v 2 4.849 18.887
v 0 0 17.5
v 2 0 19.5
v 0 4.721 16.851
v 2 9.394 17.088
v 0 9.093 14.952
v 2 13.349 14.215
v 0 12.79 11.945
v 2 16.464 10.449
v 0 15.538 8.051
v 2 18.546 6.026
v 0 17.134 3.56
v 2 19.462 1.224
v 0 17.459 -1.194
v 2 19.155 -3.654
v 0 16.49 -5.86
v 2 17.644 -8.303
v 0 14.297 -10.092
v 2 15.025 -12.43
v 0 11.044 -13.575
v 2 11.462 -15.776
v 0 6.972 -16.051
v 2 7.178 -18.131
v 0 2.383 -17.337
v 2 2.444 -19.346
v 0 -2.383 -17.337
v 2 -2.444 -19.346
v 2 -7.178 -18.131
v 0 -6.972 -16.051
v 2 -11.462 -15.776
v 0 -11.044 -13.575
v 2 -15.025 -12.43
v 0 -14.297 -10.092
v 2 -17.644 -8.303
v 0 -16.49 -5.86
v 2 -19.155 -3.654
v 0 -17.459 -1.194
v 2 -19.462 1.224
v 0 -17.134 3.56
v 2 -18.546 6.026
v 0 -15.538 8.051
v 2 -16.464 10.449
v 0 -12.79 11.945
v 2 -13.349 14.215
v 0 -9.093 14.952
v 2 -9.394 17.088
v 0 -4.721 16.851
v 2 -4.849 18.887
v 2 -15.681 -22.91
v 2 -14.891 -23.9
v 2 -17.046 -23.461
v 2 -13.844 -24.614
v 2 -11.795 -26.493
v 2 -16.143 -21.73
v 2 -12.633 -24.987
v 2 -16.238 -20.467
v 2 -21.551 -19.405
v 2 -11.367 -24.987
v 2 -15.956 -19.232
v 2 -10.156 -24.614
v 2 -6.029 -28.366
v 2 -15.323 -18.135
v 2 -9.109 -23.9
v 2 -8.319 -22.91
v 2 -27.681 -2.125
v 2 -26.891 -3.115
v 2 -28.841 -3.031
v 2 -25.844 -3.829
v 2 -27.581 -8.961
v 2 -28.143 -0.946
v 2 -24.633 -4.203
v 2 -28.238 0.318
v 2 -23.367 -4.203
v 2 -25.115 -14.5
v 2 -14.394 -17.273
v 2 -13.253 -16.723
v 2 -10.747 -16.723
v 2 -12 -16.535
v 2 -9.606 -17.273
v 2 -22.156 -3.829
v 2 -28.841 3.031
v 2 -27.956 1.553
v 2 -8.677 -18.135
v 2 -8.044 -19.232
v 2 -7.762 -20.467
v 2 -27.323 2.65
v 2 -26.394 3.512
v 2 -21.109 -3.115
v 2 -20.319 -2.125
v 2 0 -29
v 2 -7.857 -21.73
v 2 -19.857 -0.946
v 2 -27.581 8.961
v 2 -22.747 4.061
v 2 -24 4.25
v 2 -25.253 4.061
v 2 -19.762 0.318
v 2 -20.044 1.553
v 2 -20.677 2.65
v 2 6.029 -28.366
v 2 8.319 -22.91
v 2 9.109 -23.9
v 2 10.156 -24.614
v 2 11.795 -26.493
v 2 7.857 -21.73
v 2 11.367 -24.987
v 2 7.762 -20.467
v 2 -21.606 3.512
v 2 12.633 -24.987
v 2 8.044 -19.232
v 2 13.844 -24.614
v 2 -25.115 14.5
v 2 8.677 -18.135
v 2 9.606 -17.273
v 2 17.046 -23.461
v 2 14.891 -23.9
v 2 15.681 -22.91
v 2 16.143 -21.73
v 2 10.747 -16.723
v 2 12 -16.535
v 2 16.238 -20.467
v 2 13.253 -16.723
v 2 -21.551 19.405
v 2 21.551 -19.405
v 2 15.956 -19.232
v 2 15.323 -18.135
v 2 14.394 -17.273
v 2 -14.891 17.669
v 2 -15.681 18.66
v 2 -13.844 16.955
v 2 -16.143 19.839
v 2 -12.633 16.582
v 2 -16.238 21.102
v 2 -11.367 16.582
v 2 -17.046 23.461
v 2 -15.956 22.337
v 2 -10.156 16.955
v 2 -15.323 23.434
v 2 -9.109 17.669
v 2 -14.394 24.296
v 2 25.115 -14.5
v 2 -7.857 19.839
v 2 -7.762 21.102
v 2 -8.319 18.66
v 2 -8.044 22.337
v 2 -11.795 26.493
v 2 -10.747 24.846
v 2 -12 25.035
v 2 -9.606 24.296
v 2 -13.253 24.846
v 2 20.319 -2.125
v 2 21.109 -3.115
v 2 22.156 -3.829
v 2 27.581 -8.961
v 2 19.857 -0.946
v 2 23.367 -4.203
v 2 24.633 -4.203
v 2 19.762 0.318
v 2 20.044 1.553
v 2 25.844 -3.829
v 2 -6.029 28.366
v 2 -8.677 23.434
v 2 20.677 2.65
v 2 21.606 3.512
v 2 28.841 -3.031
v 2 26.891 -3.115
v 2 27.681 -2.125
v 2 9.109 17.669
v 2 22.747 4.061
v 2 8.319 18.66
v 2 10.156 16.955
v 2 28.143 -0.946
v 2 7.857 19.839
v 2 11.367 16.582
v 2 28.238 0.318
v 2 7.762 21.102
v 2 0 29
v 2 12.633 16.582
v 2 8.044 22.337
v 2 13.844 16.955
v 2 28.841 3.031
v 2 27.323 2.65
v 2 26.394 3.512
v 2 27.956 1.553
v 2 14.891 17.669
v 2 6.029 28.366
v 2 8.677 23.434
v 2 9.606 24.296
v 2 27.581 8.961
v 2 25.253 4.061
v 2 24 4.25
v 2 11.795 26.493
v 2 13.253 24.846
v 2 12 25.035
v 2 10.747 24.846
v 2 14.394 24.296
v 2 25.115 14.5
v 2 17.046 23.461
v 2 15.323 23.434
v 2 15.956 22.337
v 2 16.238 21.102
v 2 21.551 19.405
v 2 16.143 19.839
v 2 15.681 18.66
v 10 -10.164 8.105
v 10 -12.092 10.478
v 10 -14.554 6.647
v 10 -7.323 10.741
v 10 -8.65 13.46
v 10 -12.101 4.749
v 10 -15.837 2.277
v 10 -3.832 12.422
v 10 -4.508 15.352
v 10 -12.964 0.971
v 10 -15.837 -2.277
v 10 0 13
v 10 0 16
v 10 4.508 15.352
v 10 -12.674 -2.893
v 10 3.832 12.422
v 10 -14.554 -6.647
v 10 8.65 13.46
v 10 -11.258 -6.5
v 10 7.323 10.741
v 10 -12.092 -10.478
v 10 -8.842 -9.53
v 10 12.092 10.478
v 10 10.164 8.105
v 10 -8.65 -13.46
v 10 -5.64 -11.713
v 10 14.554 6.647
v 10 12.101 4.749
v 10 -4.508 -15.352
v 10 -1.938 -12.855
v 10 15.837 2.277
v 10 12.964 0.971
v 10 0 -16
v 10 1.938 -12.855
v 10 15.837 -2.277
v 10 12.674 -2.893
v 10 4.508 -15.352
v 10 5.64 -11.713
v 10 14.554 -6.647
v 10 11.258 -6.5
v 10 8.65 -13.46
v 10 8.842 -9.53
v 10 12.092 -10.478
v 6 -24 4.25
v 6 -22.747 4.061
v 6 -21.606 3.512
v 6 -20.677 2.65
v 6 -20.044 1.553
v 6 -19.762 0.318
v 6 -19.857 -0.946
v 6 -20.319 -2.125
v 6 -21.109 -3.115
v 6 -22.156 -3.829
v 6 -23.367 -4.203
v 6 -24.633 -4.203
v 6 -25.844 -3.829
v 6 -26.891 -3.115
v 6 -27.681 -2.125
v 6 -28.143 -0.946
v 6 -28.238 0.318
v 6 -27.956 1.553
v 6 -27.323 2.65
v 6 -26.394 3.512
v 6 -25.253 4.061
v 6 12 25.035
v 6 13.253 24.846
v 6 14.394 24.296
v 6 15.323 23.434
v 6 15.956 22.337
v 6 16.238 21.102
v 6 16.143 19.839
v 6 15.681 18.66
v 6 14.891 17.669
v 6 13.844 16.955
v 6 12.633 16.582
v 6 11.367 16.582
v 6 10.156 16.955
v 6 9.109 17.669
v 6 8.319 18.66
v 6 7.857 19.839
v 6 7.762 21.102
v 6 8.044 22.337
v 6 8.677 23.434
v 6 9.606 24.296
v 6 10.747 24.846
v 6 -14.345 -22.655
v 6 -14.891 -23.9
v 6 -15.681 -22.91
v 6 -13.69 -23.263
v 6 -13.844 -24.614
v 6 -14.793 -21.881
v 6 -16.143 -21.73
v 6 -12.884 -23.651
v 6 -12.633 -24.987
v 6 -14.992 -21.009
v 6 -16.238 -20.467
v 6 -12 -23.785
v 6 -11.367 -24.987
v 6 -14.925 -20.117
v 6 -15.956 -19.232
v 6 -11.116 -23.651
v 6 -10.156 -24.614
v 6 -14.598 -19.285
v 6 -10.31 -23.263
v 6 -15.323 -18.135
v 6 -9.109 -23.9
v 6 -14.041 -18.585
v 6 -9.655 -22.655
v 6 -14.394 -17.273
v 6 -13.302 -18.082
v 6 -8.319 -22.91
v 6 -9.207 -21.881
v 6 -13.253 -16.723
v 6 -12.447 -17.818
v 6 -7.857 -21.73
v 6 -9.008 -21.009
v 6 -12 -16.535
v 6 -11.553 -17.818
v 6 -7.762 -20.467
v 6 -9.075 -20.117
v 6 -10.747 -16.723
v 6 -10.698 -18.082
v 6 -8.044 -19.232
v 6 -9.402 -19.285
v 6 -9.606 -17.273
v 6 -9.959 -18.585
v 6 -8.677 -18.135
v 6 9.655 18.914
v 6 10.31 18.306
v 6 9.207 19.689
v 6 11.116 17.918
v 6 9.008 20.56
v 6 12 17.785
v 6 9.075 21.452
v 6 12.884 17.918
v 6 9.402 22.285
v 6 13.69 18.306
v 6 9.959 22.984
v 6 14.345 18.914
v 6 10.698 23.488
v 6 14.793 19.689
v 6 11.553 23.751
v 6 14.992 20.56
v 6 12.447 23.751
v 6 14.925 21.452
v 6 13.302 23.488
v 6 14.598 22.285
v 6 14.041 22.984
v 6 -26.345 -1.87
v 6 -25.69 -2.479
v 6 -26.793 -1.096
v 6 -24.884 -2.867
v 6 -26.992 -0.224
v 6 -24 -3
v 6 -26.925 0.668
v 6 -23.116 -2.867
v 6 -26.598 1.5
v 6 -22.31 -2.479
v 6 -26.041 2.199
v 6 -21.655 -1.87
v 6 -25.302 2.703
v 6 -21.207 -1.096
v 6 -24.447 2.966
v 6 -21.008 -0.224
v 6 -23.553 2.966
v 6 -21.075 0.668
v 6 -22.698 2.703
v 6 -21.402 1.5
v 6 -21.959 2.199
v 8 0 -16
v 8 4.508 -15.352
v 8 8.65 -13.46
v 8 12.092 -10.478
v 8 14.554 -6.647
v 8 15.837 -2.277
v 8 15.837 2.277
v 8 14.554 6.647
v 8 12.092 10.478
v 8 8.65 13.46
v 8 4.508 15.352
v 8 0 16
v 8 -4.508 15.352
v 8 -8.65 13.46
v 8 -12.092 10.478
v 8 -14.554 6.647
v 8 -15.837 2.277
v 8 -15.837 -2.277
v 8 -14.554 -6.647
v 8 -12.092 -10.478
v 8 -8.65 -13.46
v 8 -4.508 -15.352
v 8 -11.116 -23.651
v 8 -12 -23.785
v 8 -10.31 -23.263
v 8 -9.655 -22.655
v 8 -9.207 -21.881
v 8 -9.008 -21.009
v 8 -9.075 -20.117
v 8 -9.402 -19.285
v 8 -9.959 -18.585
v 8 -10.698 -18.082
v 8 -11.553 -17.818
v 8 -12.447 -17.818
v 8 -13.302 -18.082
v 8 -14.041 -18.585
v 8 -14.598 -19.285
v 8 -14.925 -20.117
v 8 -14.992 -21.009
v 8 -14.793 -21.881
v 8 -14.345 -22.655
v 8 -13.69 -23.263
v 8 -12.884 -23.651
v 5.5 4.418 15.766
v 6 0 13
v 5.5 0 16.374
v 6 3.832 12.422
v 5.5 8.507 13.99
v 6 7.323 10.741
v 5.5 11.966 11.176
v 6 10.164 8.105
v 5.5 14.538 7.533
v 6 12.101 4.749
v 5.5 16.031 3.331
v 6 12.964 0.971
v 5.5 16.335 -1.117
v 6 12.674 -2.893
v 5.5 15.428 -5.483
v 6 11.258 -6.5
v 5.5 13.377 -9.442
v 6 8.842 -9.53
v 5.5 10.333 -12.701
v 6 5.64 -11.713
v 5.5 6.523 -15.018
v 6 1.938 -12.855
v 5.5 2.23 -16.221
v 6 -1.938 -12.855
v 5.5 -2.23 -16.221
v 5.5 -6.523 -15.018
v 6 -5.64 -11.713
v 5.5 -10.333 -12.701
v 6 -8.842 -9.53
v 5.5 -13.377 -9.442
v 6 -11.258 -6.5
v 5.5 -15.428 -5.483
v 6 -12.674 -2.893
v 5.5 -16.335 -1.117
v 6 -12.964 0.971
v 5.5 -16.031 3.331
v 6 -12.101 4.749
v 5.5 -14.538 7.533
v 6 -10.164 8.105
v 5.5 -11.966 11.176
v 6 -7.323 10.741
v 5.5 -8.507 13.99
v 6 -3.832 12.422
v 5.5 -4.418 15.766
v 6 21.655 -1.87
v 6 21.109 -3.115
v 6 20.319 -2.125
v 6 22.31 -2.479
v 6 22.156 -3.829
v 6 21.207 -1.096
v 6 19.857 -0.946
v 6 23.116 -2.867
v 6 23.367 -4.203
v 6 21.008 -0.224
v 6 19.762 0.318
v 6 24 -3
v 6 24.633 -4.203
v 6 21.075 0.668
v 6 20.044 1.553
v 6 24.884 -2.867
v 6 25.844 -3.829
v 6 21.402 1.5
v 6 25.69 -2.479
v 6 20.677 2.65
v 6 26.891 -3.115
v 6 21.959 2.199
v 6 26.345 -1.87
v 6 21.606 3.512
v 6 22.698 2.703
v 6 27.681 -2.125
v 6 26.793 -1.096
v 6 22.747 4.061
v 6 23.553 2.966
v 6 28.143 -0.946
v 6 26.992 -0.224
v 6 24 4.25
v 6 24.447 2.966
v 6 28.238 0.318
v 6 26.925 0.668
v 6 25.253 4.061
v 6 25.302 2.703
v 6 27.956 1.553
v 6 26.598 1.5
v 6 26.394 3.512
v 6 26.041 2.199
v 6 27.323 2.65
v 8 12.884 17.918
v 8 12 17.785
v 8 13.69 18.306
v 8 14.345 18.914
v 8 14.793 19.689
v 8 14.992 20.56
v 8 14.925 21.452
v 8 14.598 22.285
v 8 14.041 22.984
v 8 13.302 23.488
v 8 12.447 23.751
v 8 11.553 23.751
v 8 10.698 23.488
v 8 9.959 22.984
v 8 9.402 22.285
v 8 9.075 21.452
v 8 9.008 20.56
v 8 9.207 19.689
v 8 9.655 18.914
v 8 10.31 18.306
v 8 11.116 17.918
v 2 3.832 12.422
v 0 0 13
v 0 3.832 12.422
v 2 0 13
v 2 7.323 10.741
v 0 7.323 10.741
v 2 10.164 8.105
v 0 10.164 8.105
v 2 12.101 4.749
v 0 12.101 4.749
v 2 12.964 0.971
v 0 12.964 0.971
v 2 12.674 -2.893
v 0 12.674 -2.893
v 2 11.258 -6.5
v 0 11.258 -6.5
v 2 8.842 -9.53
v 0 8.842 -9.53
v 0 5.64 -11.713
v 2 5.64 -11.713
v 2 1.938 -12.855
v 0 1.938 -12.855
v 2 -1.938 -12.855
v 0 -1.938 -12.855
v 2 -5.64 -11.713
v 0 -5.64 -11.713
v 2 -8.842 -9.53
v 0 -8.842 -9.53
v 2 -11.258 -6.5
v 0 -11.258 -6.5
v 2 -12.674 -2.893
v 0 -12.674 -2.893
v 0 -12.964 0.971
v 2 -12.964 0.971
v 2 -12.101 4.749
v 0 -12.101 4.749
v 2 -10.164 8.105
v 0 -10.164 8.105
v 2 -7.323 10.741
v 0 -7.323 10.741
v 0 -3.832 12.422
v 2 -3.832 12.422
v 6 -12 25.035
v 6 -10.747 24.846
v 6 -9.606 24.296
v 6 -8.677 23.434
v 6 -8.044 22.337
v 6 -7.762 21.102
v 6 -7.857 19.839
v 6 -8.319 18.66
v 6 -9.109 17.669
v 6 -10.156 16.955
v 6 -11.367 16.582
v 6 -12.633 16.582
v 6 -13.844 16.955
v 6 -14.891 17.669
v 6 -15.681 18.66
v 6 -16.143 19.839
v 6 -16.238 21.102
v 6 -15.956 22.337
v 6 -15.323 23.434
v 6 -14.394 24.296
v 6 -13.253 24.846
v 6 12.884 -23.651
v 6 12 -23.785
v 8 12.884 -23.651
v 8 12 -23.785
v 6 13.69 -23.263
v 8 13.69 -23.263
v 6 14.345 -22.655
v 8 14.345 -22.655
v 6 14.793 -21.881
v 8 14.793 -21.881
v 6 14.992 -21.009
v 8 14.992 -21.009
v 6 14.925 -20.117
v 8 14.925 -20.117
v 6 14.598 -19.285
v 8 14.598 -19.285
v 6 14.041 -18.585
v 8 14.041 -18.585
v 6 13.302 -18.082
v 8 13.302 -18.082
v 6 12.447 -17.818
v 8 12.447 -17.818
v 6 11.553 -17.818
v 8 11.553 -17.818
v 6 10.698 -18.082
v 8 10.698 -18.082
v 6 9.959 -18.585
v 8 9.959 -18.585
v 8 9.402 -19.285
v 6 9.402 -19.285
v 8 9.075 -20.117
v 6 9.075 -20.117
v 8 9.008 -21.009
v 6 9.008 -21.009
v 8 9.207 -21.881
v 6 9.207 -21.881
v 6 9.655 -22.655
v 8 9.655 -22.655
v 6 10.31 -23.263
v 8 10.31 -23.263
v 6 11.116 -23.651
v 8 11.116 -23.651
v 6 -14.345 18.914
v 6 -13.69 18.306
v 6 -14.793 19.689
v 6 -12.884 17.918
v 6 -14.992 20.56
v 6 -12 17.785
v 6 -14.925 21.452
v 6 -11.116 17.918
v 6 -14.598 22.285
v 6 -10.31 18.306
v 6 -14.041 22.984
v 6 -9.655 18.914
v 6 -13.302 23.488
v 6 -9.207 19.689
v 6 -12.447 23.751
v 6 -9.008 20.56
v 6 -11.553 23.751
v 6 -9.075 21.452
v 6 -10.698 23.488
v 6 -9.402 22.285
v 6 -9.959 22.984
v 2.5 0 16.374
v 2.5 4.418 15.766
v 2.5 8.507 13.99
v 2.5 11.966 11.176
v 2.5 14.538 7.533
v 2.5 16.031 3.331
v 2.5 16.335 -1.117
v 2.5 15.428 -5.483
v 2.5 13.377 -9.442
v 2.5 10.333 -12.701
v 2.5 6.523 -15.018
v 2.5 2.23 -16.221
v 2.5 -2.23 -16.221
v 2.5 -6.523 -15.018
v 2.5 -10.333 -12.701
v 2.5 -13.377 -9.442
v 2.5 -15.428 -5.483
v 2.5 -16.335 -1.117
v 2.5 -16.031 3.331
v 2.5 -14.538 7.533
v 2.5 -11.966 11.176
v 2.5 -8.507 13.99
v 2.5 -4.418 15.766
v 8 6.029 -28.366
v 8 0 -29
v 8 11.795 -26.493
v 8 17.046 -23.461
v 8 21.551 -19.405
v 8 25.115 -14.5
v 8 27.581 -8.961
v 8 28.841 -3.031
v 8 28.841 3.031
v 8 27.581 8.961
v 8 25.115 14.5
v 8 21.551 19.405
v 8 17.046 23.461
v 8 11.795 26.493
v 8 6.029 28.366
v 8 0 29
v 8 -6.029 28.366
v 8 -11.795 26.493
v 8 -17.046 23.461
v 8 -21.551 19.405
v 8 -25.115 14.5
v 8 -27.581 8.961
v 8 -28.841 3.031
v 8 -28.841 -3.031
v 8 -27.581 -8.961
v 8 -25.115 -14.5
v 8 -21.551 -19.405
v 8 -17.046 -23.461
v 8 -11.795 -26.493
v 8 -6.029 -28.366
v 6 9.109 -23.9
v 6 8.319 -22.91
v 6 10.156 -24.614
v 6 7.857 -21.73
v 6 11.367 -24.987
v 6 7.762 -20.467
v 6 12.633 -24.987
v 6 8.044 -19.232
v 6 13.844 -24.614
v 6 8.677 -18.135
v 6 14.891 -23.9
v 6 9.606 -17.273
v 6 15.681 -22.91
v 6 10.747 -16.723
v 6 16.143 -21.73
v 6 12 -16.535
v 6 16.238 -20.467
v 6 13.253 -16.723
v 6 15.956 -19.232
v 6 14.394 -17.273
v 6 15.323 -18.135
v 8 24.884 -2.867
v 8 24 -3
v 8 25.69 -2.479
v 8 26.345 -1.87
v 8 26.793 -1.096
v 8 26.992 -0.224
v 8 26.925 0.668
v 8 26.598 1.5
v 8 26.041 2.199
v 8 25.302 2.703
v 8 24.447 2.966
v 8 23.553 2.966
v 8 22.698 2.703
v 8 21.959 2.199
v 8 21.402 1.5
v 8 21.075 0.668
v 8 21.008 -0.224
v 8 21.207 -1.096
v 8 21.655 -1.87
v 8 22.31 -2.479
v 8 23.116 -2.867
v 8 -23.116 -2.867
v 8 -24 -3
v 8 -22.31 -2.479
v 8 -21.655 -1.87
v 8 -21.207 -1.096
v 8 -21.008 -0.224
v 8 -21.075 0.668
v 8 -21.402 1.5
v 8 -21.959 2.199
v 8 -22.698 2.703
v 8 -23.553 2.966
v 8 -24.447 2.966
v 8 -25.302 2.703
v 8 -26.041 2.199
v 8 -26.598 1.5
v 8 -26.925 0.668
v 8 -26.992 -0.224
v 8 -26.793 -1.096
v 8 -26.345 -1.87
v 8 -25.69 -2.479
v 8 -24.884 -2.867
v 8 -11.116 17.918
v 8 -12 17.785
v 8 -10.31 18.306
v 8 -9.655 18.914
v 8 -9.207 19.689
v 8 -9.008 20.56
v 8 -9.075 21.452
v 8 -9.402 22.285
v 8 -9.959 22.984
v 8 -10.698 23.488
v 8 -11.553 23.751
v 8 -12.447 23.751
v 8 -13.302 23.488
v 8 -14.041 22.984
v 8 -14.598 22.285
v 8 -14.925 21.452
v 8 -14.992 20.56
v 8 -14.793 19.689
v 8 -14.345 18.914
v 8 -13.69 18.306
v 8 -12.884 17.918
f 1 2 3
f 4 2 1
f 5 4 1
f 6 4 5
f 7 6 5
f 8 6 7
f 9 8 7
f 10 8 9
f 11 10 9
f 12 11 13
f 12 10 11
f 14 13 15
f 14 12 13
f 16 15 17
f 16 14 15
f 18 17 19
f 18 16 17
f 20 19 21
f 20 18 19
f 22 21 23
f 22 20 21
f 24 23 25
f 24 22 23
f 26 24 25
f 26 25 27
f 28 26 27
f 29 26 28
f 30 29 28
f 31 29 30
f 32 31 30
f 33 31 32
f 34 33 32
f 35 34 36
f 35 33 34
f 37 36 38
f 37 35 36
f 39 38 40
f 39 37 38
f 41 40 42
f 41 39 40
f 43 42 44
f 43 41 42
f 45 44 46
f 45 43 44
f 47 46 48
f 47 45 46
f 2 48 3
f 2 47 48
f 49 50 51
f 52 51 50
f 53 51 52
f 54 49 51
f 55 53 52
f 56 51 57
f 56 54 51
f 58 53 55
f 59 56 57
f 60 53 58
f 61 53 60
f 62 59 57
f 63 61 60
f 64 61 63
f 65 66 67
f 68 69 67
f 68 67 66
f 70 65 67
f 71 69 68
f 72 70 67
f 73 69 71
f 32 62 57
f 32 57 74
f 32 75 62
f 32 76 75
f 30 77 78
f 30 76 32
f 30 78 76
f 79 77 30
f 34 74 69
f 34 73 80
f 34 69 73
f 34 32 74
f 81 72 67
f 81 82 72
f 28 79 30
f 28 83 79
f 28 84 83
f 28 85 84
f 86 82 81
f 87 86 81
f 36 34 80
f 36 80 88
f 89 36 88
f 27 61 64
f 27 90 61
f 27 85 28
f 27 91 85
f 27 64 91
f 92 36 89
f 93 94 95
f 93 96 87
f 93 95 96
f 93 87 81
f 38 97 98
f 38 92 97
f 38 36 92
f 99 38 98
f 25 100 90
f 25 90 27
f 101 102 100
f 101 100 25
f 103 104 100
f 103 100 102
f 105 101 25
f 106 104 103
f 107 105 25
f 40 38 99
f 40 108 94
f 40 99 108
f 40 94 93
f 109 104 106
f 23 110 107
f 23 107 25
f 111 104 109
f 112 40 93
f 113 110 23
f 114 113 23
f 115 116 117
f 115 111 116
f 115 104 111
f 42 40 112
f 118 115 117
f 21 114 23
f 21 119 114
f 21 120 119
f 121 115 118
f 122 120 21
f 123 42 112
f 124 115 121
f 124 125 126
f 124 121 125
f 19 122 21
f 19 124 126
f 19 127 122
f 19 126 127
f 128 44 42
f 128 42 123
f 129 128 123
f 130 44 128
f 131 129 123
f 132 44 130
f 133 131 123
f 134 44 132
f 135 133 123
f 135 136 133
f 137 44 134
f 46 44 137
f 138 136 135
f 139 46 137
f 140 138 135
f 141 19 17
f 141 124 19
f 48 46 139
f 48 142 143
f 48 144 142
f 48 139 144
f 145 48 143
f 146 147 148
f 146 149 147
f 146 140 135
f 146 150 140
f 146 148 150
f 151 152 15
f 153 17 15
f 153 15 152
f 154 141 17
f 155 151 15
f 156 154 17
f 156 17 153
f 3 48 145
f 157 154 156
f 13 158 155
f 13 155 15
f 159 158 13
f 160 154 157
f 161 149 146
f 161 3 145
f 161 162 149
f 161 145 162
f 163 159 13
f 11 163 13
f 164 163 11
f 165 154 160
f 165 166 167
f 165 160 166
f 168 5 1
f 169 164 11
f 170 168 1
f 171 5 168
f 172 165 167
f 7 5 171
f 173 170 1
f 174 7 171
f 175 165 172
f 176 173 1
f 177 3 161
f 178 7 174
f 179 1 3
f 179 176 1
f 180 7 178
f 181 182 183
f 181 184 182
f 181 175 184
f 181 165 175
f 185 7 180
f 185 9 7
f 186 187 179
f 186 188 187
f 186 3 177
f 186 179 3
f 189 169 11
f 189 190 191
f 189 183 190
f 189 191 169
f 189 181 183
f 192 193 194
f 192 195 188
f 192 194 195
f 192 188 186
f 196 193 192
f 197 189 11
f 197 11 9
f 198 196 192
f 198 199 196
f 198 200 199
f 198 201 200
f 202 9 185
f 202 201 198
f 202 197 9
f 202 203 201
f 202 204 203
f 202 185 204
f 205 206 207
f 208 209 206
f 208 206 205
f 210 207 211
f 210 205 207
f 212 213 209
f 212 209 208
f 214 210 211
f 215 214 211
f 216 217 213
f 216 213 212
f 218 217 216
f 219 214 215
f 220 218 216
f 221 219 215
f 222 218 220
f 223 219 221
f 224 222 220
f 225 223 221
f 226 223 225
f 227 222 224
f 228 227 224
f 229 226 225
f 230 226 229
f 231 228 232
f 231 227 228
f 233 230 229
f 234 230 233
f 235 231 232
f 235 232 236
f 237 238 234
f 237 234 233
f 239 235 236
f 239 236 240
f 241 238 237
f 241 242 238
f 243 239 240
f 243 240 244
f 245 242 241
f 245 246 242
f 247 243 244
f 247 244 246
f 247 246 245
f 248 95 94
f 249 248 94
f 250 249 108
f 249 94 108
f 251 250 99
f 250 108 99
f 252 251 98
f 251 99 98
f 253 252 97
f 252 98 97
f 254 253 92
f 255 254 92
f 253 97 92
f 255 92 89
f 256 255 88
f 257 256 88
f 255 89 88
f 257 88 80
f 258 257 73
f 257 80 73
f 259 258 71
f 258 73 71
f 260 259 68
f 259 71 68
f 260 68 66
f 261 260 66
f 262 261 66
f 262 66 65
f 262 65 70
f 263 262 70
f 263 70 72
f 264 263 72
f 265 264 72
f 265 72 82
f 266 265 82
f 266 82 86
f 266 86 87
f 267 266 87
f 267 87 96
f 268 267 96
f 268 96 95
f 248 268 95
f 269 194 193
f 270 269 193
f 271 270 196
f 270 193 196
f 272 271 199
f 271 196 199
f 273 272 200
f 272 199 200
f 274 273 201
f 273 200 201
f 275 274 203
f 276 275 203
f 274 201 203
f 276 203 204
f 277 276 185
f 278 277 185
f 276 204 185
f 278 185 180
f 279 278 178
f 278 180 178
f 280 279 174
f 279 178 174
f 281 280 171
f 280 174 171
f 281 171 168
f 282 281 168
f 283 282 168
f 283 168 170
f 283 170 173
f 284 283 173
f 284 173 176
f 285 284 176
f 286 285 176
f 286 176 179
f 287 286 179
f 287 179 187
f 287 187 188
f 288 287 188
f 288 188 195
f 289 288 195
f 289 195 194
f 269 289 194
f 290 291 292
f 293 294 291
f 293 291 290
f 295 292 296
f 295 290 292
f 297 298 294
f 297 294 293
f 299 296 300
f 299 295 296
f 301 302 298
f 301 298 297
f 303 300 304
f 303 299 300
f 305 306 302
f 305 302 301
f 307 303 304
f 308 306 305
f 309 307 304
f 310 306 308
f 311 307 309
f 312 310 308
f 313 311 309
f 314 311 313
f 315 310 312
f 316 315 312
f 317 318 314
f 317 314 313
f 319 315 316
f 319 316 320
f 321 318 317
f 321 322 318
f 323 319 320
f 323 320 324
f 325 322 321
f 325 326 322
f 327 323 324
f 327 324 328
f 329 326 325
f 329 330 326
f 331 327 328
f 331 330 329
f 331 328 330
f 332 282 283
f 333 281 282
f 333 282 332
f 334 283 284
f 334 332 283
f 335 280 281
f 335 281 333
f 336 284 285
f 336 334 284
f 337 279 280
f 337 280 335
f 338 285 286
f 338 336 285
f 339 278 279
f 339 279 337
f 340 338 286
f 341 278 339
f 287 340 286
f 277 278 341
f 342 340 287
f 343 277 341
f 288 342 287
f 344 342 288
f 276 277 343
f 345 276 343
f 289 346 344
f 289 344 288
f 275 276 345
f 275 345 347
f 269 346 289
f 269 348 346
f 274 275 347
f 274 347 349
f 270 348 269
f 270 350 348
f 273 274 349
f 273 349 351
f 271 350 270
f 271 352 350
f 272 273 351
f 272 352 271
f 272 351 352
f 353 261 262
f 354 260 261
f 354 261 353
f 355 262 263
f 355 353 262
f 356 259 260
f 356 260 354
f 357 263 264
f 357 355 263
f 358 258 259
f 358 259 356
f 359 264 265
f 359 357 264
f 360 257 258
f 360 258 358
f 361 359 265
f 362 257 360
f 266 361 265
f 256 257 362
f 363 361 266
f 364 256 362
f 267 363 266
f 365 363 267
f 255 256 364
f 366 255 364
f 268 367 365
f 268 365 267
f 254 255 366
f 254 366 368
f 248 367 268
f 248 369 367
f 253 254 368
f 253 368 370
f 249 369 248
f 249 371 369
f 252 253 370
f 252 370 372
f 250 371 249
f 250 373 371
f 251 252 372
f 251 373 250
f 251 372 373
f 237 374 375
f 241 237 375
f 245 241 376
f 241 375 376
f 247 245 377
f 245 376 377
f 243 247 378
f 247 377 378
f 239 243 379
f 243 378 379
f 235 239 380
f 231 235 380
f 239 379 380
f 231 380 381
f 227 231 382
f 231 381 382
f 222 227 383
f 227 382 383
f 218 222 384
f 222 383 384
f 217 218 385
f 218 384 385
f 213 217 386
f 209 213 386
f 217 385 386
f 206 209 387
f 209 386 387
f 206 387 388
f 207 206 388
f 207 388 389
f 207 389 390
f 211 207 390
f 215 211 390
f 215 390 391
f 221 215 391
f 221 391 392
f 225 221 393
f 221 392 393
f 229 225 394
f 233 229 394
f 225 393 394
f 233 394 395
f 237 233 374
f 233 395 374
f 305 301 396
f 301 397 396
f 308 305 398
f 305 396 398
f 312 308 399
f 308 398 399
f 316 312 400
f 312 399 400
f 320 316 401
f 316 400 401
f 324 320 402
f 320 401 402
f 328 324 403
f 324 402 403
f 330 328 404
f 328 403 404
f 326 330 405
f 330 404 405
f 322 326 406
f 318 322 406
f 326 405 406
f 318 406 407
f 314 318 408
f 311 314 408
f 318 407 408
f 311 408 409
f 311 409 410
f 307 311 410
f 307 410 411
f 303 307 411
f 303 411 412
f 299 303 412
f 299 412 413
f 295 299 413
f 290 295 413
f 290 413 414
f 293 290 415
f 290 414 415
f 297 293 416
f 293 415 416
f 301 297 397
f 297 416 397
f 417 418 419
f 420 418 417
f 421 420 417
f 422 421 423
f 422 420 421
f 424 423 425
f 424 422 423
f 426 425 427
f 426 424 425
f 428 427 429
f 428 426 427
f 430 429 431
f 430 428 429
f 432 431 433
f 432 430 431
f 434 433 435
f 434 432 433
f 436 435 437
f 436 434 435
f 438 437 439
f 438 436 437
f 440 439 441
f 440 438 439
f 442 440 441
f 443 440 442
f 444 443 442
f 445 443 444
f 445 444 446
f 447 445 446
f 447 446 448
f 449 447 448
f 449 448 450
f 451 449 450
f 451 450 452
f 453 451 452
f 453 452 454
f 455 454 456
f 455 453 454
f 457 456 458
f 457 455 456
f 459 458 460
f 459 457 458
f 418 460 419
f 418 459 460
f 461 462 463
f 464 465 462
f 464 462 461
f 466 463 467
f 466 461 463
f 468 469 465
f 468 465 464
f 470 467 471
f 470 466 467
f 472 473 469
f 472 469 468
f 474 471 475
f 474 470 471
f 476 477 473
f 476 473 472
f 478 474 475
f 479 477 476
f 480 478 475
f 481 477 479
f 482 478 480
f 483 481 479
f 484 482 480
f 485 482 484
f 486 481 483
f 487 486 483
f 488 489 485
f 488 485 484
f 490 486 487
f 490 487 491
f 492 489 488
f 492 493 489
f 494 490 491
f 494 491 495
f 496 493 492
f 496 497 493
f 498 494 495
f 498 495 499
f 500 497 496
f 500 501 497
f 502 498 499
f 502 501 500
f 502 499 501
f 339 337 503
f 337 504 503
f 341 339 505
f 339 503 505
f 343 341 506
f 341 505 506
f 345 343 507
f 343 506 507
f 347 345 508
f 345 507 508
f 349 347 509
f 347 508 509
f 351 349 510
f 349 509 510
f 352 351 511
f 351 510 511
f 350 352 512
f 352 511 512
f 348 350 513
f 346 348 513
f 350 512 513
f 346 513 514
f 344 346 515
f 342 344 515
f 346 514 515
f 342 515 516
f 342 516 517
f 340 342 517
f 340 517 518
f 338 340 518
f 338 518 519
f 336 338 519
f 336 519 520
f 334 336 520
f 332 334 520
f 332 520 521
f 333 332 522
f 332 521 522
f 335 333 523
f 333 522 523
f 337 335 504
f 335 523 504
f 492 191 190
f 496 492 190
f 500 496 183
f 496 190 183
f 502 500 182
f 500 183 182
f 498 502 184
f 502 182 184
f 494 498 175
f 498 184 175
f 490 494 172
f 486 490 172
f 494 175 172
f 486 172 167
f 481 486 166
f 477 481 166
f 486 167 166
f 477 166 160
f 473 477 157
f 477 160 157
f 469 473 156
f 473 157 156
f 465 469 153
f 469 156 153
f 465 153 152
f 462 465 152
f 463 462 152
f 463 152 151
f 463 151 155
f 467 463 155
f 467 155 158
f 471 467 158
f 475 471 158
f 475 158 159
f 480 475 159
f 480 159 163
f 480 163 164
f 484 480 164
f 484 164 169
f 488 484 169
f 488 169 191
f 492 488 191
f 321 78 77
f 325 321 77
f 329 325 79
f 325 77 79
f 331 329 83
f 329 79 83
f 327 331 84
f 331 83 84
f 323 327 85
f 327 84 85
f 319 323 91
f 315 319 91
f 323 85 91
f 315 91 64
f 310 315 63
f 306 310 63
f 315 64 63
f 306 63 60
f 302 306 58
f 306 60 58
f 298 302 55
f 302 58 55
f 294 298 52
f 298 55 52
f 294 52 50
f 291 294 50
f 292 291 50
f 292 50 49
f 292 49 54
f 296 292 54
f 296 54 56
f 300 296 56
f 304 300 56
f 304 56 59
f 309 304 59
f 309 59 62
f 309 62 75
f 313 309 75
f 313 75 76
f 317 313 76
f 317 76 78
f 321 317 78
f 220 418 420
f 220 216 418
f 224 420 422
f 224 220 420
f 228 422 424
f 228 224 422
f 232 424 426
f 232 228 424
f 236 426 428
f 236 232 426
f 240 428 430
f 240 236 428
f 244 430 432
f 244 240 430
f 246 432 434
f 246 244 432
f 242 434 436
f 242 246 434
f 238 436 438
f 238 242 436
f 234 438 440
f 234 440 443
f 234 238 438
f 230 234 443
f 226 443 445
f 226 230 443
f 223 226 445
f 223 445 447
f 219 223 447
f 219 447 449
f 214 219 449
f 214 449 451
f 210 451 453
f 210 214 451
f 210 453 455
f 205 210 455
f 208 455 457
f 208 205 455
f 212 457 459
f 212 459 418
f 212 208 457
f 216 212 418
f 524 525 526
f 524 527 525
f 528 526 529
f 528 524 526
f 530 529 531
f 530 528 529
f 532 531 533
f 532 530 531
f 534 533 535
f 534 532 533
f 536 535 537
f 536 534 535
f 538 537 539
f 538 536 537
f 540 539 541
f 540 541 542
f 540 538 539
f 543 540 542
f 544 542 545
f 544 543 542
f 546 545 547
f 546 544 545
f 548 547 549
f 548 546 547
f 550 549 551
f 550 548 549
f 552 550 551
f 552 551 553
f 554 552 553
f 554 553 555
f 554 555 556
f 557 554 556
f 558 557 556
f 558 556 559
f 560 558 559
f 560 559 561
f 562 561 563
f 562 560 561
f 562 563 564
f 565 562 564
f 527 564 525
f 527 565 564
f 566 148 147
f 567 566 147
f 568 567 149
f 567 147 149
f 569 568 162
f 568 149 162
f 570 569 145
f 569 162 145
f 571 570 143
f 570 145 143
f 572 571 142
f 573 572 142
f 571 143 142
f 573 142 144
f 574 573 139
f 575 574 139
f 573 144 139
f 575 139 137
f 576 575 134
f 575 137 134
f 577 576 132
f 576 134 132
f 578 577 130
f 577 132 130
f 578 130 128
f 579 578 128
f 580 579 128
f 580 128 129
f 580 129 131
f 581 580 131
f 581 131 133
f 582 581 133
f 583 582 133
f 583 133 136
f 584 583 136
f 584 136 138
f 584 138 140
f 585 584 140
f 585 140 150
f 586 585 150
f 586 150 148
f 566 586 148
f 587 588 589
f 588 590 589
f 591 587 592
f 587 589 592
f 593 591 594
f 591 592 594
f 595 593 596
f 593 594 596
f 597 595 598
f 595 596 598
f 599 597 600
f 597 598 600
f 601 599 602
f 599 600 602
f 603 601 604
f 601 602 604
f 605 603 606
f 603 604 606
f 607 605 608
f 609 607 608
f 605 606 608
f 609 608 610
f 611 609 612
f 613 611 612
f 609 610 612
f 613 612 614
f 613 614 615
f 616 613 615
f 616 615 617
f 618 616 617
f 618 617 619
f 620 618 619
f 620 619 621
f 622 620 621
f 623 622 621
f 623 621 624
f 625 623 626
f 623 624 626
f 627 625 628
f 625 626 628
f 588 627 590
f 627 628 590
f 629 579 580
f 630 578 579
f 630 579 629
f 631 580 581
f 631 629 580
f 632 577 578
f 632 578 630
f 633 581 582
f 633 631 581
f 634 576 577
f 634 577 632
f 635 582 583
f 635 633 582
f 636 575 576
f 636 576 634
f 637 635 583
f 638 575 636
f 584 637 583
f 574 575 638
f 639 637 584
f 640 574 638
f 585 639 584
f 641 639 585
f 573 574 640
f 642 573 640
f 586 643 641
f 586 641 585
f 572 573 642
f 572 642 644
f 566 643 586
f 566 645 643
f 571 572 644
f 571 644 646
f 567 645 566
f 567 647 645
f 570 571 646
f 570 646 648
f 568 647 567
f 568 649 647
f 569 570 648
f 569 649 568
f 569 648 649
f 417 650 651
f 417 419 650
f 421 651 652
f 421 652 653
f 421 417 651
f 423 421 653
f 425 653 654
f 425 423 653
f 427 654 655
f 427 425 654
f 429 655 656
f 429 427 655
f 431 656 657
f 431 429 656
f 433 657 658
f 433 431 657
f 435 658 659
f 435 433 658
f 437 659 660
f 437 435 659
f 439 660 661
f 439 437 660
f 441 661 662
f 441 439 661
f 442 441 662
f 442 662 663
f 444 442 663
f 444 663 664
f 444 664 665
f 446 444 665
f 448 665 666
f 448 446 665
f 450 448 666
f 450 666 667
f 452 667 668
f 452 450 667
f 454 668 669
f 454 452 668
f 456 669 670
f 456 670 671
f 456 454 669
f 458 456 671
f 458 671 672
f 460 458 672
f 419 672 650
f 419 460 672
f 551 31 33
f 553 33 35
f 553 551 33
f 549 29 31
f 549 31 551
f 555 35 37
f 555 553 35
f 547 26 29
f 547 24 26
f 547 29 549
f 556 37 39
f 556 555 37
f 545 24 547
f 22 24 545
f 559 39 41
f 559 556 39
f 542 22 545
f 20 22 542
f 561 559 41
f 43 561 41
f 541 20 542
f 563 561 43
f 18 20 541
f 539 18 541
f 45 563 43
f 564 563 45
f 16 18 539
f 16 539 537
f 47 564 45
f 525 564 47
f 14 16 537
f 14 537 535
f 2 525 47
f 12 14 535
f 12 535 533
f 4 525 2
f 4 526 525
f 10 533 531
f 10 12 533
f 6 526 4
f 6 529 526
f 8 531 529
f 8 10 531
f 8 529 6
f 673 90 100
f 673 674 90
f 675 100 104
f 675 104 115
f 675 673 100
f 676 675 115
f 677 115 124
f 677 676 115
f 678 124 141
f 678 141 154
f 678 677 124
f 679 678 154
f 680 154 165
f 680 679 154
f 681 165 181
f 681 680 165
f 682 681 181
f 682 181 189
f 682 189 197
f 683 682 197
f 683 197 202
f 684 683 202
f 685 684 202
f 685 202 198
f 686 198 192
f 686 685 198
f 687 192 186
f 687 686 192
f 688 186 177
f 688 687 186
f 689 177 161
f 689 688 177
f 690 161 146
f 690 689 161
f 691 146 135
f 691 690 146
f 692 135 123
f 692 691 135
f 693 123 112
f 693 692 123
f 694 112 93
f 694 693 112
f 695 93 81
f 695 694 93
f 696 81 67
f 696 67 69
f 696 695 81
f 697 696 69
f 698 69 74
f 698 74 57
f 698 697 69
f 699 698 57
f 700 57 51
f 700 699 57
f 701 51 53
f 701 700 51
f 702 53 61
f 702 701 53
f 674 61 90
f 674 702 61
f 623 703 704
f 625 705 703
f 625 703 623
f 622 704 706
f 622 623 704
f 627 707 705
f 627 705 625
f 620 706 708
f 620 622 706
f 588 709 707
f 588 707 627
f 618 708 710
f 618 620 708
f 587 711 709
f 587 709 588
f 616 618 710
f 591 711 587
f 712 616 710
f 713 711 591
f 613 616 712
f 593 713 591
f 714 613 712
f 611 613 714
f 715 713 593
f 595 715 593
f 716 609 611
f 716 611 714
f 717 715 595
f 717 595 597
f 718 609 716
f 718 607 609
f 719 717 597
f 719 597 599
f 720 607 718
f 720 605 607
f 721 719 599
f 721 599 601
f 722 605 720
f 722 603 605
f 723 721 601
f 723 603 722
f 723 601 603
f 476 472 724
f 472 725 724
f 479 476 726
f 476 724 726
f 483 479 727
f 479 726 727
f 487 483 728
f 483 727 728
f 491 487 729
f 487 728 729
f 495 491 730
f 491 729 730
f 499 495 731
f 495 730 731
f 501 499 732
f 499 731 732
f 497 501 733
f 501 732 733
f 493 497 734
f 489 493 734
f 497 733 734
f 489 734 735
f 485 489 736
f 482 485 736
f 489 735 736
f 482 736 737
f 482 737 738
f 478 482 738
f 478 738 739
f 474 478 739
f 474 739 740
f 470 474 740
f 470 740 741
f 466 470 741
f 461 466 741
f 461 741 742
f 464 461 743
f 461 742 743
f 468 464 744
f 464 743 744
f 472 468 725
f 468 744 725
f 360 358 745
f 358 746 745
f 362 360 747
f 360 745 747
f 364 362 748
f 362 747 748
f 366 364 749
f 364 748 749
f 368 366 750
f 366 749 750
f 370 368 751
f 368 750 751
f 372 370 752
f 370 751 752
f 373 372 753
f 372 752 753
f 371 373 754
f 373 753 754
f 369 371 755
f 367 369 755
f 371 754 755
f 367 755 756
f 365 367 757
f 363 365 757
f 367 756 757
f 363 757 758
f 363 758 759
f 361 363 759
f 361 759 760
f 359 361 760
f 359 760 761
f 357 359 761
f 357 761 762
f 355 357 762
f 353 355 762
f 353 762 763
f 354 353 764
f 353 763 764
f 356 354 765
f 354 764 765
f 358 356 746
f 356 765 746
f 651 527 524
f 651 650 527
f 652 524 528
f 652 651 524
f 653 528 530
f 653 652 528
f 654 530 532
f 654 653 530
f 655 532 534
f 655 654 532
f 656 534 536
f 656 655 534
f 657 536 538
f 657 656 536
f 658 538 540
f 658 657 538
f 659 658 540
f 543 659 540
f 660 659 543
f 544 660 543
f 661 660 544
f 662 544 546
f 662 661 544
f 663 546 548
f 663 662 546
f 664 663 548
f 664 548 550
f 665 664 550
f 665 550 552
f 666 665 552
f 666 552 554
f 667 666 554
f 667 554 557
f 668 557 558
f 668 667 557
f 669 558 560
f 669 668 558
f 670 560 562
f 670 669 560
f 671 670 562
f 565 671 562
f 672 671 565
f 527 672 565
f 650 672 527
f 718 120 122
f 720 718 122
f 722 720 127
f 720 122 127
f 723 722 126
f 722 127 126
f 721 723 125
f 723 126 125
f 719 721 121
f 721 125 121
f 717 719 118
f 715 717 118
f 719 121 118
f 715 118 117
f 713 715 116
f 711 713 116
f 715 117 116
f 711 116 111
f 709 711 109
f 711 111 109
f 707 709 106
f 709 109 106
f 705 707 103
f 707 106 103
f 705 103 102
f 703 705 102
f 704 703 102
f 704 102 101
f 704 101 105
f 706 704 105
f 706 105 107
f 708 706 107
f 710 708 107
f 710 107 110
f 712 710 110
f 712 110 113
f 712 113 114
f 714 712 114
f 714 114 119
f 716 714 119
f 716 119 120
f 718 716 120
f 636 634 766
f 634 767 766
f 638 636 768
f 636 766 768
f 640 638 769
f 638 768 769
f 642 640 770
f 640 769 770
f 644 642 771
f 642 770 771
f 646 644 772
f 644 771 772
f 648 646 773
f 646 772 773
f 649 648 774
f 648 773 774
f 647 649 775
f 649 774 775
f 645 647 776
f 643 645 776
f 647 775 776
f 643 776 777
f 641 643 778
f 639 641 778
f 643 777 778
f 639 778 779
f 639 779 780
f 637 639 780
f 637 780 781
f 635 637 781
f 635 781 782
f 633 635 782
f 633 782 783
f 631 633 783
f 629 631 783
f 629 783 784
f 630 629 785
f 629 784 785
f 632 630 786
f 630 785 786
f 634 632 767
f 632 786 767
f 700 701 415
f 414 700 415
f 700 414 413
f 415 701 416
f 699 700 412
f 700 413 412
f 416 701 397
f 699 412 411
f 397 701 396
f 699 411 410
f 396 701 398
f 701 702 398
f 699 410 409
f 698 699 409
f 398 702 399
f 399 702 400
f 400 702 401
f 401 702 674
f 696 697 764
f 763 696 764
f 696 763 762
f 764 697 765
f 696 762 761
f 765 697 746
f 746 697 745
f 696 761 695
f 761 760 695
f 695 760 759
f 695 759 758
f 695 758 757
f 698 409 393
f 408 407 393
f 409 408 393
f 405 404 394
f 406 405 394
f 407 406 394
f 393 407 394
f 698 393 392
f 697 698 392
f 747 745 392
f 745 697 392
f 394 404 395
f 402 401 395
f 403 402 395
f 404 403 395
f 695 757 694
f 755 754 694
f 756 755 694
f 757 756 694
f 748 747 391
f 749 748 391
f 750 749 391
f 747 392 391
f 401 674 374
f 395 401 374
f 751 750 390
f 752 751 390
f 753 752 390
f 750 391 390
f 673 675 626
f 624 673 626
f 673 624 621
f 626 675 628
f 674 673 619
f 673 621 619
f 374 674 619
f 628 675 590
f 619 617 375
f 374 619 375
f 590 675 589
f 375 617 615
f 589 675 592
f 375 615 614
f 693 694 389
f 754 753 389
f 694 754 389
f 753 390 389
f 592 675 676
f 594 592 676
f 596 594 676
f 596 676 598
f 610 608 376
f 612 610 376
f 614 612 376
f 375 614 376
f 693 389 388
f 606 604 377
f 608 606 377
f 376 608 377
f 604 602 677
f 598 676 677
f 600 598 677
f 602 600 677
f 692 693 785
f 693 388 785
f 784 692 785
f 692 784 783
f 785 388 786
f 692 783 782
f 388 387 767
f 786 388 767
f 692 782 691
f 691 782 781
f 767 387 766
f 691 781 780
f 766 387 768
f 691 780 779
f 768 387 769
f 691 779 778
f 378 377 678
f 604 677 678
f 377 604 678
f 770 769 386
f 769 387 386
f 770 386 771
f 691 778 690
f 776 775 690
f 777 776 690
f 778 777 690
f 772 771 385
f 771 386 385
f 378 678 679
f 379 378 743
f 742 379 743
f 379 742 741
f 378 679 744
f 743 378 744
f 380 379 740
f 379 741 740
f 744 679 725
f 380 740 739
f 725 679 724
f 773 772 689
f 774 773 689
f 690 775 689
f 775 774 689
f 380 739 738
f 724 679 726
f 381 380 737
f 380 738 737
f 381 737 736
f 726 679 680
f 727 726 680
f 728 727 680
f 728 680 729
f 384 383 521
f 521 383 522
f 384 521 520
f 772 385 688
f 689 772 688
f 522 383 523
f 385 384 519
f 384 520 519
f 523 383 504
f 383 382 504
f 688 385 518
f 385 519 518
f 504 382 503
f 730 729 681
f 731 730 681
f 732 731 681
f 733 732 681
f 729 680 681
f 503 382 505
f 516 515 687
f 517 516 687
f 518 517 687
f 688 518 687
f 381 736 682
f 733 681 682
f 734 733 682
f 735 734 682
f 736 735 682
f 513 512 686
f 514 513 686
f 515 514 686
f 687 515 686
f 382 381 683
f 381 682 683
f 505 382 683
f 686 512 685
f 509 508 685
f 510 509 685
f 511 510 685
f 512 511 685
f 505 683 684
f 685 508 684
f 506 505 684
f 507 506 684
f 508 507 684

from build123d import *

# Parameters (mm, degrees)
SKETCH_1_W                = 6
SKETCH_1_H                = 29
SKETCH_2_R                = 19.5
EXTRUDE_1_DEPTH           = 2
EXTRUDE_1_TAPER           = 45
SKETCH_3_R                = 16
EXTRUDE_2_DEPTH           = 2
HOLE_WIZARD_1_D           = 6
HOLE_WIZARD_1_DEPTH       = 8
HOLE_WIZARD_1_CBORE_D     = 8.5
HOLE_WIZARD_1_CBORE_DEPTH = 4


with BuildPart() as part:
    # Эскиз1 → Повернуть1 (revolve)
    with BuildSketch(Plane.XY, mode=Mode.PRIVATE) as revolve_1_sk:
        with Locations((5, 14.5)):
            Rectangle(SKETCH_1_W, SKETCH_1_H)
    revolve(revolve_1_sk.sketch.rotate(Axis((2, 0, 0), (1, 0, 0)), 270), axis=Axis((2, 0, 0), (1, 0, 0)))

    # Эскиз2 → Бобышка-Вытянуть1 (add)
    with BuildSketch(Plane.ZY.offset(-2)):
        Circle(SKETCH_2_R)
    extrude(amount=EXTRUDE_1_DEPTH, taper=EXTRUDE_1_TAPER)

    # Эскиз3 → Бобышка-Вытянуть2 (add)
    with BuildSketch(Plane(origin=(8, 0, 0), x_dir=(0, 0, -1), z_dir=(1, 0, 0))):
        Circle(SKETCH_3_R)
    extrude(amount=EXTRUDE_2_DEPTH)

    # Эскиз4 → Вырез-Повернуть1 (revolve, cut)
    with BuildSketch(Plane(origin=(0, 0, 0), x_dir=(-1, 0, 0), z_dir=(0, 0, -1)), mode=Mode.PRIVATE) as cut_revolve_1_sk:
        Polygon((-10, 13), (-10, 0), (0, 0), (0, 13), (-2, 13), (-2.5, 16.373590872), (-5.5, 16.373590872), (-6, 13), align=None)
    revolve(cut_revolve_1_sk.sketch.rotate(Axis((10, 0, 0), (-1, 0, 0)), 270), axis=Axis((10, 0, 0), (-1, 0, 0)), mode=Mode.SUBTRACT)

    # Отверстие1
    with Locations(Plane.ZY.offset(-2)):
        with Locations((20.784609691, -12), (0, -24), (-20.784609691, -12), (-20.784609691, 12), (0, 24), (20.784609691, 12)):
            CounterBoreHole(HOLE_WIZARD_1_D / 2, HOLE_WIZARD_1_CBORE_D / 2, HOLE_WIZARD_1_CBORE_DEPTH, depth=HOLE_WIZARD_1_DEPTH)


solid = part.part
